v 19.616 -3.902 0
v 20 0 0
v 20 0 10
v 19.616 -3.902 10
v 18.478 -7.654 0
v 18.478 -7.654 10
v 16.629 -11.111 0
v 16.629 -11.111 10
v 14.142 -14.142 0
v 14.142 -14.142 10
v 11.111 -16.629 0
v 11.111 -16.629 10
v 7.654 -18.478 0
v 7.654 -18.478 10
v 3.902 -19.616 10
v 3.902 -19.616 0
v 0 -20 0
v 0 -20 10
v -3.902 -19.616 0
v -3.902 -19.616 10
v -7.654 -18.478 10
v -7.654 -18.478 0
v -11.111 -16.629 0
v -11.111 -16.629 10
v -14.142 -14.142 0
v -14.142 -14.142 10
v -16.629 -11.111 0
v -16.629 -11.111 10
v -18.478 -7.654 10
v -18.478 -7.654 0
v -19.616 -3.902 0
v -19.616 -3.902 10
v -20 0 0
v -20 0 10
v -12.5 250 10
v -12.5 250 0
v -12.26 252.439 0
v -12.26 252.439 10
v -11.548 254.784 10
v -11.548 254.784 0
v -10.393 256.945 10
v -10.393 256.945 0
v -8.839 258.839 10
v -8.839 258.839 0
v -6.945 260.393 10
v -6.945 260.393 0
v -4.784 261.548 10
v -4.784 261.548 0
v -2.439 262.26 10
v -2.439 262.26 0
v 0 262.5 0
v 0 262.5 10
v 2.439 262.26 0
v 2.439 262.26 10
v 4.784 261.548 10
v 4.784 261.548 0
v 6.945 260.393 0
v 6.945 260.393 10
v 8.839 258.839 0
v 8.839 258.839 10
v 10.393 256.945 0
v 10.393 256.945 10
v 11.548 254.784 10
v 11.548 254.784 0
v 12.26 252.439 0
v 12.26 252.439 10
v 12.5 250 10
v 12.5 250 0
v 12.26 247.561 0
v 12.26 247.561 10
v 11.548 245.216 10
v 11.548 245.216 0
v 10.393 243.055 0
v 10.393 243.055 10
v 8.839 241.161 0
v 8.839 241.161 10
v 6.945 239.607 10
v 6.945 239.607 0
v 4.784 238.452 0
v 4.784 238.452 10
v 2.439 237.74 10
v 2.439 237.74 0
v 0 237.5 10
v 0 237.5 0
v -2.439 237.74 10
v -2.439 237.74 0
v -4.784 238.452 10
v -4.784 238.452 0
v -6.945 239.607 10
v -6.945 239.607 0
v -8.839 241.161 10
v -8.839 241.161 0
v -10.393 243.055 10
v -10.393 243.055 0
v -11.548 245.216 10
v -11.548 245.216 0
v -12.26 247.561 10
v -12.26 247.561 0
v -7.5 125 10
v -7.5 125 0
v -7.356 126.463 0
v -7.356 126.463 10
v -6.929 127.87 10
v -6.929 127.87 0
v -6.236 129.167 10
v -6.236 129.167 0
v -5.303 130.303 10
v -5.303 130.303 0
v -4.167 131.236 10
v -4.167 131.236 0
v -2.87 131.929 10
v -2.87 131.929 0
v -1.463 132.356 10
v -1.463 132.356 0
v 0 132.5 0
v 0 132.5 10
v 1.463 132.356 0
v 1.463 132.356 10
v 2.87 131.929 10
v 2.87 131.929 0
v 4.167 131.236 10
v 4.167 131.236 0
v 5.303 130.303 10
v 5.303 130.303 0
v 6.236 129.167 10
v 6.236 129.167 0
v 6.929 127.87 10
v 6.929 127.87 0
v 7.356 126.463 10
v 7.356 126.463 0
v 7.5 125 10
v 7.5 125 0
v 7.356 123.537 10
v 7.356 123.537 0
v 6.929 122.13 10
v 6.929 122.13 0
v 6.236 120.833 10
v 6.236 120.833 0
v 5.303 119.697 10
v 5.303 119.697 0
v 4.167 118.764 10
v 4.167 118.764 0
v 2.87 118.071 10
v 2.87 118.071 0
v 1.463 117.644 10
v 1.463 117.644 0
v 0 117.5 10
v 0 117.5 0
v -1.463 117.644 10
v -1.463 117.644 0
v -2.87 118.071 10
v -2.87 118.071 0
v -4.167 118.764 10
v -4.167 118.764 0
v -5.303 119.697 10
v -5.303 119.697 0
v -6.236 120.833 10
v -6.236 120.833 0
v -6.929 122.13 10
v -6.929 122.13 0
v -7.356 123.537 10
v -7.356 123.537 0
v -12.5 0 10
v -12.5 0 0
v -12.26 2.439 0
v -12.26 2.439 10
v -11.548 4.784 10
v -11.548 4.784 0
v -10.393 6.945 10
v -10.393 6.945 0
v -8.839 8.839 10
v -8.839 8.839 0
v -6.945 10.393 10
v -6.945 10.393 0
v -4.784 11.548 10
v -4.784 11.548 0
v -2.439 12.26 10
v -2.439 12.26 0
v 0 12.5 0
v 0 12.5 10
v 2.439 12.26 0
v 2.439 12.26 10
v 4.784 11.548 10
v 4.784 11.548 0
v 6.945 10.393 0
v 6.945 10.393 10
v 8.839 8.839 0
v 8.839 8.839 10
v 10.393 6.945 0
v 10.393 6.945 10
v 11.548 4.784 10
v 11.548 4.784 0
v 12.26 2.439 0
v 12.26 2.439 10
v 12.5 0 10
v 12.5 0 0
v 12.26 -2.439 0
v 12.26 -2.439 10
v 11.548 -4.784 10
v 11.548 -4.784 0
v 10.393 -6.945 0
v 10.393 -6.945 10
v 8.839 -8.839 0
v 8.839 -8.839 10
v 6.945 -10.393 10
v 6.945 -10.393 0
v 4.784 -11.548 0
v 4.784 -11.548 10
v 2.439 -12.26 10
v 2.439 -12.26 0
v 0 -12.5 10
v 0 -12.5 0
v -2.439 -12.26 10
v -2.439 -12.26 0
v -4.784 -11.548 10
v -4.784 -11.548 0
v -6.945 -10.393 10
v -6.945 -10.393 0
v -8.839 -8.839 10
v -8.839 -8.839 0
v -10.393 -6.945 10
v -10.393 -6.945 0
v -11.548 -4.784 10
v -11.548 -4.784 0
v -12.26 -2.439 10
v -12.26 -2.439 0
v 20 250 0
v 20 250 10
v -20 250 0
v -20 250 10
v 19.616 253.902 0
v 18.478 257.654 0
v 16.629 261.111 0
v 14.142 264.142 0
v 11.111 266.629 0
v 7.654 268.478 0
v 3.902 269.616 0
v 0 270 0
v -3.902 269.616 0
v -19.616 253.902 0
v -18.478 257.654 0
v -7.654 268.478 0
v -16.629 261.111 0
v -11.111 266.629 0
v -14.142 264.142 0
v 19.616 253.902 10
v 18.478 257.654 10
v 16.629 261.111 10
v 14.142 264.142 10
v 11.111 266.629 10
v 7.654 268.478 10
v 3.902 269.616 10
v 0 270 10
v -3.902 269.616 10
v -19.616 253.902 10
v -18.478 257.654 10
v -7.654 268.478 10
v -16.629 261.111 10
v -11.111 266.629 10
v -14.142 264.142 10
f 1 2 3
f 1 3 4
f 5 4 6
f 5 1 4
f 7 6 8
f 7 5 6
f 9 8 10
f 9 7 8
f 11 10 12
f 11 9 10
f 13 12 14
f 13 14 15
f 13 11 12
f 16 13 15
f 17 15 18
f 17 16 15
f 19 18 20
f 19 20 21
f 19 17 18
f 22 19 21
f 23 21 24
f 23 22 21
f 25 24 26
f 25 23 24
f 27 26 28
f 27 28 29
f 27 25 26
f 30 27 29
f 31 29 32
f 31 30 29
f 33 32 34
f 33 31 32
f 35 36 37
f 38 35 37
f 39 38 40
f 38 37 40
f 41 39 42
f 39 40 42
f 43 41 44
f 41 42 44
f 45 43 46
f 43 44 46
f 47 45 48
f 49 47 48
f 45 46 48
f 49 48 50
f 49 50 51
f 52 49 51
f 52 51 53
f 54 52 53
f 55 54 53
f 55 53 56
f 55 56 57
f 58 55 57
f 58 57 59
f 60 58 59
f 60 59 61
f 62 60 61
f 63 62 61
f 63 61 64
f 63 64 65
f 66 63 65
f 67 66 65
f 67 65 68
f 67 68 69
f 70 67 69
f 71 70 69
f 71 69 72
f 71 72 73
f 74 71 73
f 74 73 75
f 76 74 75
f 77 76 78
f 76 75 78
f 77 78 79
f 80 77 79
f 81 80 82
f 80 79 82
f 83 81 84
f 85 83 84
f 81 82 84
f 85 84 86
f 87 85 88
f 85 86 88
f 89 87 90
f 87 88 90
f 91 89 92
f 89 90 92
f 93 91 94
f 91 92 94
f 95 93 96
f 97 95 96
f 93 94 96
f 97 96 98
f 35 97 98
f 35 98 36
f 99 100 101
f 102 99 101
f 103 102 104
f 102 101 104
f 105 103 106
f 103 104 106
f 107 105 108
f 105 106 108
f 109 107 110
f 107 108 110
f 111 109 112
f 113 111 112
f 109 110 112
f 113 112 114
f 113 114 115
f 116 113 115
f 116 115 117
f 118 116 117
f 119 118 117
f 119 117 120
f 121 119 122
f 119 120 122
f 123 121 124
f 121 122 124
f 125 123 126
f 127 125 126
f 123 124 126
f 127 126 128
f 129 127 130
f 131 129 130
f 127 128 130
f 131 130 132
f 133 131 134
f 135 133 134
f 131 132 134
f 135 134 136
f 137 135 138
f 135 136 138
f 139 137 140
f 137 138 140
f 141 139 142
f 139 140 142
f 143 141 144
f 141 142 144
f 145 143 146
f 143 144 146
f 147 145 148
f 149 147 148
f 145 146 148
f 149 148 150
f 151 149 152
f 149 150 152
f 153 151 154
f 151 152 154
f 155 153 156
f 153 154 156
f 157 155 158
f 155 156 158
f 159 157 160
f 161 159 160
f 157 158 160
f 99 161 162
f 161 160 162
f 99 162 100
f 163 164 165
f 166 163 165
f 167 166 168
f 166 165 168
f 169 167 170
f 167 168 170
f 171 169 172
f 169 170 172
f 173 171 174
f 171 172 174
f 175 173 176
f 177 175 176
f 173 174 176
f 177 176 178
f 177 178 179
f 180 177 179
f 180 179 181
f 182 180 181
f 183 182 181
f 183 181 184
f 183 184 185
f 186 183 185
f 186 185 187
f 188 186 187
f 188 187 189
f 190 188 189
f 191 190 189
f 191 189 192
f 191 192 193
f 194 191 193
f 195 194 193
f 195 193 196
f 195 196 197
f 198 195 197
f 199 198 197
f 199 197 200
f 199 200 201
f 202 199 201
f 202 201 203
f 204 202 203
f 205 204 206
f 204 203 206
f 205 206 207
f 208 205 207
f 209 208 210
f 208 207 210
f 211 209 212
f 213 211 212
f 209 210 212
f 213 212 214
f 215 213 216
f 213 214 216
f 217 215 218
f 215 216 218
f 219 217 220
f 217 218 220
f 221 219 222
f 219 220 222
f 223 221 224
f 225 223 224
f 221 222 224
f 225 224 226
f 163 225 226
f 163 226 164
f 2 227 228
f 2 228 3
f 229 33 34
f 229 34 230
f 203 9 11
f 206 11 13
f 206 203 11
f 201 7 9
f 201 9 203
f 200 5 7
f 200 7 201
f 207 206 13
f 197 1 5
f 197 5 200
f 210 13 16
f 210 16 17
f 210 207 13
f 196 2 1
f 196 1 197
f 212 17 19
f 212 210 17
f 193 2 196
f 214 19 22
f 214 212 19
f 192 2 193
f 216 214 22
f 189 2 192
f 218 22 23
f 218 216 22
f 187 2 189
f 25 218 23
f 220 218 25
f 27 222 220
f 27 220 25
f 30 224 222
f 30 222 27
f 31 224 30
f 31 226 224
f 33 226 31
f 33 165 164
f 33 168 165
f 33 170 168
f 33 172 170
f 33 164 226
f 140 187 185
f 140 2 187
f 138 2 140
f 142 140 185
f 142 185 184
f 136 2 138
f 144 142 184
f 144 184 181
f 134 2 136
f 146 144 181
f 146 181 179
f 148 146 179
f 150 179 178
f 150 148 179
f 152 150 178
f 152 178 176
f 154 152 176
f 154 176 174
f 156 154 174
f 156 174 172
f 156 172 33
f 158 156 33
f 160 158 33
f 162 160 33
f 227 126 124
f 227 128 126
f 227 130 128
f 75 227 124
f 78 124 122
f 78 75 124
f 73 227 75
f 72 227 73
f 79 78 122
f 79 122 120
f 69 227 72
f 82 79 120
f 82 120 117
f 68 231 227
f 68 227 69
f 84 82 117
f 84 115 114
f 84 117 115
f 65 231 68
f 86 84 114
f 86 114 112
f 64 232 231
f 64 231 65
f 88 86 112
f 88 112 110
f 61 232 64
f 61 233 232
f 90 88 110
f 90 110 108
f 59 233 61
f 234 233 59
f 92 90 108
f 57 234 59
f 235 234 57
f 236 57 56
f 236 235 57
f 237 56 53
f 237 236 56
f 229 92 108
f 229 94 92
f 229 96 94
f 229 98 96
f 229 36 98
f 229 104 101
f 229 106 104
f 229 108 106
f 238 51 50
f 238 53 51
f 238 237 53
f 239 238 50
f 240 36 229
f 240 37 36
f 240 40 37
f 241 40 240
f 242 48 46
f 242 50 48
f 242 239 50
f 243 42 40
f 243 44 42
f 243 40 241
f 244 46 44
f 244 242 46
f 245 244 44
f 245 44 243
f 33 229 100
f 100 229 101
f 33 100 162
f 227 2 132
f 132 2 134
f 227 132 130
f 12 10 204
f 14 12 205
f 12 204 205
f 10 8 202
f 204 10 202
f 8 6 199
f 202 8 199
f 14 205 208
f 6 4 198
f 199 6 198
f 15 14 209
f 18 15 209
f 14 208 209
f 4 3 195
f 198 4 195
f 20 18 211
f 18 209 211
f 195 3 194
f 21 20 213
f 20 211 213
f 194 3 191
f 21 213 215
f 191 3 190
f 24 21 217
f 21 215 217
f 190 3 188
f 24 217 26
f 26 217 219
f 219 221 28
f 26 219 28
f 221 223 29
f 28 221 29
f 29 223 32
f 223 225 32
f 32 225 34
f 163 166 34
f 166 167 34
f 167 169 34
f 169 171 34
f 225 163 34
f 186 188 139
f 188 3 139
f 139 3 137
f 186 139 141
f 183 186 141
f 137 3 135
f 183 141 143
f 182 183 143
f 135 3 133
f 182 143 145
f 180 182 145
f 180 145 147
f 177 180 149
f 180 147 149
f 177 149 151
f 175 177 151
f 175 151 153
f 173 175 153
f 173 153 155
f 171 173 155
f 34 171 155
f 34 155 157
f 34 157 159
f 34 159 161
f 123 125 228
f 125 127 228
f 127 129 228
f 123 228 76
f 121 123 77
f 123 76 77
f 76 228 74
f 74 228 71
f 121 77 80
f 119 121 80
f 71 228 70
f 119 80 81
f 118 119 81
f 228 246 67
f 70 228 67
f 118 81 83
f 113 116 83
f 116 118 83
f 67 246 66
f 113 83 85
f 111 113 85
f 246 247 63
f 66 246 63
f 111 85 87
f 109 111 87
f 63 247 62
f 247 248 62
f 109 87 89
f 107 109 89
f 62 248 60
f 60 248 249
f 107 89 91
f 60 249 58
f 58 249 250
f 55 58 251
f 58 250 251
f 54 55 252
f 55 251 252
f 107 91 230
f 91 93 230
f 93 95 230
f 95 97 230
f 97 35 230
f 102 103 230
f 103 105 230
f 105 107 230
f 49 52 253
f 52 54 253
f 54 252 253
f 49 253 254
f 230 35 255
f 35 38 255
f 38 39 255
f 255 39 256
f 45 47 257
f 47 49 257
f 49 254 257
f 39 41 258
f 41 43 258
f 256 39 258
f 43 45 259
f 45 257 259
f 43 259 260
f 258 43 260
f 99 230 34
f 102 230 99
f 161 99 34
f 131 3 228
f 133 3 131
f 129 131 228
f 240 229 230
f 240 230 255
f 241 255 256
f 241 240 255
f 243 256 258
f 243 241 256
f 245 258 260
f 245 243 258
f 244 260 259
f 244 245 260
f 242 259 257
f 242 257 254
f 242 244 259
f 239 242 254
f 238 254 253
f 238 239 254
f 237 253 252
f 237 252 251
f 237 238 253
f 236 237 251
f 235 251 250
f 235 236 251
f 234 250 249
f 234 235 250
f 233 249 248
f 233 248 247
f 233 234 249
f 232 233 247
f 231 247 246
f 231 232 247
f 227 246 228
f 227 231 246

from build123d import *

# Parameters (mm, degrees)
BOSS_EXTRUDE1_DEPTH = 10
SKETCH2_R           = 12.5
CUT_EXTRUDE1_DEPTH  = 271.924343683
SKETCH3_R           = 7.5
CUT_EXTRUDE2_DEPTH  = 10


with BuildPart() as part:
    # Sketch1 → Boss-Extrude1 (new body)
    with BuildSketch(Plane.XY):
        with BuildLine():
            Line((-20, 0), (-20, 250))
            ThreePointArc((-20, 250), (0, 270), (20, 250))
            Line((20, 250), (20, 0))
            ThreePointArc((20, 0), (0, -20), (-20, 0))
        make_face()
    extrude(amount=BOSS_EXTRUDE1_DEPTH)

    # Sketch2 → Cut-Extrude1 (cut, through all)
    with BuildSketch(Plane(origin=(0, 0, 0), x_dir=(-1, 0, 0), z_dir=(0, 0, -1))):
        Circle(SKETCH2_R)
        with Locations((0, 250)):
            Circle(SKETCH2_R)
    extrude(amount=-CUT_EXTRUDE1_DEPTH, mode=Mode.SUBTRACT)

    # Sketch3 → Cut-Extrude2 (cut)
    with BuildSketch(Plane(origin=(0, 0, 0), x_dir=(-1, 0, 0), z_dir=(0, 0, -1))):
        with Locations((0, 125)):
            Circle(SKETCH3_R)
    extrude(amount=-CUT_EXTRUDE2_DEPTH, mode=Mode.SUBTRACT)


solid = part.part
